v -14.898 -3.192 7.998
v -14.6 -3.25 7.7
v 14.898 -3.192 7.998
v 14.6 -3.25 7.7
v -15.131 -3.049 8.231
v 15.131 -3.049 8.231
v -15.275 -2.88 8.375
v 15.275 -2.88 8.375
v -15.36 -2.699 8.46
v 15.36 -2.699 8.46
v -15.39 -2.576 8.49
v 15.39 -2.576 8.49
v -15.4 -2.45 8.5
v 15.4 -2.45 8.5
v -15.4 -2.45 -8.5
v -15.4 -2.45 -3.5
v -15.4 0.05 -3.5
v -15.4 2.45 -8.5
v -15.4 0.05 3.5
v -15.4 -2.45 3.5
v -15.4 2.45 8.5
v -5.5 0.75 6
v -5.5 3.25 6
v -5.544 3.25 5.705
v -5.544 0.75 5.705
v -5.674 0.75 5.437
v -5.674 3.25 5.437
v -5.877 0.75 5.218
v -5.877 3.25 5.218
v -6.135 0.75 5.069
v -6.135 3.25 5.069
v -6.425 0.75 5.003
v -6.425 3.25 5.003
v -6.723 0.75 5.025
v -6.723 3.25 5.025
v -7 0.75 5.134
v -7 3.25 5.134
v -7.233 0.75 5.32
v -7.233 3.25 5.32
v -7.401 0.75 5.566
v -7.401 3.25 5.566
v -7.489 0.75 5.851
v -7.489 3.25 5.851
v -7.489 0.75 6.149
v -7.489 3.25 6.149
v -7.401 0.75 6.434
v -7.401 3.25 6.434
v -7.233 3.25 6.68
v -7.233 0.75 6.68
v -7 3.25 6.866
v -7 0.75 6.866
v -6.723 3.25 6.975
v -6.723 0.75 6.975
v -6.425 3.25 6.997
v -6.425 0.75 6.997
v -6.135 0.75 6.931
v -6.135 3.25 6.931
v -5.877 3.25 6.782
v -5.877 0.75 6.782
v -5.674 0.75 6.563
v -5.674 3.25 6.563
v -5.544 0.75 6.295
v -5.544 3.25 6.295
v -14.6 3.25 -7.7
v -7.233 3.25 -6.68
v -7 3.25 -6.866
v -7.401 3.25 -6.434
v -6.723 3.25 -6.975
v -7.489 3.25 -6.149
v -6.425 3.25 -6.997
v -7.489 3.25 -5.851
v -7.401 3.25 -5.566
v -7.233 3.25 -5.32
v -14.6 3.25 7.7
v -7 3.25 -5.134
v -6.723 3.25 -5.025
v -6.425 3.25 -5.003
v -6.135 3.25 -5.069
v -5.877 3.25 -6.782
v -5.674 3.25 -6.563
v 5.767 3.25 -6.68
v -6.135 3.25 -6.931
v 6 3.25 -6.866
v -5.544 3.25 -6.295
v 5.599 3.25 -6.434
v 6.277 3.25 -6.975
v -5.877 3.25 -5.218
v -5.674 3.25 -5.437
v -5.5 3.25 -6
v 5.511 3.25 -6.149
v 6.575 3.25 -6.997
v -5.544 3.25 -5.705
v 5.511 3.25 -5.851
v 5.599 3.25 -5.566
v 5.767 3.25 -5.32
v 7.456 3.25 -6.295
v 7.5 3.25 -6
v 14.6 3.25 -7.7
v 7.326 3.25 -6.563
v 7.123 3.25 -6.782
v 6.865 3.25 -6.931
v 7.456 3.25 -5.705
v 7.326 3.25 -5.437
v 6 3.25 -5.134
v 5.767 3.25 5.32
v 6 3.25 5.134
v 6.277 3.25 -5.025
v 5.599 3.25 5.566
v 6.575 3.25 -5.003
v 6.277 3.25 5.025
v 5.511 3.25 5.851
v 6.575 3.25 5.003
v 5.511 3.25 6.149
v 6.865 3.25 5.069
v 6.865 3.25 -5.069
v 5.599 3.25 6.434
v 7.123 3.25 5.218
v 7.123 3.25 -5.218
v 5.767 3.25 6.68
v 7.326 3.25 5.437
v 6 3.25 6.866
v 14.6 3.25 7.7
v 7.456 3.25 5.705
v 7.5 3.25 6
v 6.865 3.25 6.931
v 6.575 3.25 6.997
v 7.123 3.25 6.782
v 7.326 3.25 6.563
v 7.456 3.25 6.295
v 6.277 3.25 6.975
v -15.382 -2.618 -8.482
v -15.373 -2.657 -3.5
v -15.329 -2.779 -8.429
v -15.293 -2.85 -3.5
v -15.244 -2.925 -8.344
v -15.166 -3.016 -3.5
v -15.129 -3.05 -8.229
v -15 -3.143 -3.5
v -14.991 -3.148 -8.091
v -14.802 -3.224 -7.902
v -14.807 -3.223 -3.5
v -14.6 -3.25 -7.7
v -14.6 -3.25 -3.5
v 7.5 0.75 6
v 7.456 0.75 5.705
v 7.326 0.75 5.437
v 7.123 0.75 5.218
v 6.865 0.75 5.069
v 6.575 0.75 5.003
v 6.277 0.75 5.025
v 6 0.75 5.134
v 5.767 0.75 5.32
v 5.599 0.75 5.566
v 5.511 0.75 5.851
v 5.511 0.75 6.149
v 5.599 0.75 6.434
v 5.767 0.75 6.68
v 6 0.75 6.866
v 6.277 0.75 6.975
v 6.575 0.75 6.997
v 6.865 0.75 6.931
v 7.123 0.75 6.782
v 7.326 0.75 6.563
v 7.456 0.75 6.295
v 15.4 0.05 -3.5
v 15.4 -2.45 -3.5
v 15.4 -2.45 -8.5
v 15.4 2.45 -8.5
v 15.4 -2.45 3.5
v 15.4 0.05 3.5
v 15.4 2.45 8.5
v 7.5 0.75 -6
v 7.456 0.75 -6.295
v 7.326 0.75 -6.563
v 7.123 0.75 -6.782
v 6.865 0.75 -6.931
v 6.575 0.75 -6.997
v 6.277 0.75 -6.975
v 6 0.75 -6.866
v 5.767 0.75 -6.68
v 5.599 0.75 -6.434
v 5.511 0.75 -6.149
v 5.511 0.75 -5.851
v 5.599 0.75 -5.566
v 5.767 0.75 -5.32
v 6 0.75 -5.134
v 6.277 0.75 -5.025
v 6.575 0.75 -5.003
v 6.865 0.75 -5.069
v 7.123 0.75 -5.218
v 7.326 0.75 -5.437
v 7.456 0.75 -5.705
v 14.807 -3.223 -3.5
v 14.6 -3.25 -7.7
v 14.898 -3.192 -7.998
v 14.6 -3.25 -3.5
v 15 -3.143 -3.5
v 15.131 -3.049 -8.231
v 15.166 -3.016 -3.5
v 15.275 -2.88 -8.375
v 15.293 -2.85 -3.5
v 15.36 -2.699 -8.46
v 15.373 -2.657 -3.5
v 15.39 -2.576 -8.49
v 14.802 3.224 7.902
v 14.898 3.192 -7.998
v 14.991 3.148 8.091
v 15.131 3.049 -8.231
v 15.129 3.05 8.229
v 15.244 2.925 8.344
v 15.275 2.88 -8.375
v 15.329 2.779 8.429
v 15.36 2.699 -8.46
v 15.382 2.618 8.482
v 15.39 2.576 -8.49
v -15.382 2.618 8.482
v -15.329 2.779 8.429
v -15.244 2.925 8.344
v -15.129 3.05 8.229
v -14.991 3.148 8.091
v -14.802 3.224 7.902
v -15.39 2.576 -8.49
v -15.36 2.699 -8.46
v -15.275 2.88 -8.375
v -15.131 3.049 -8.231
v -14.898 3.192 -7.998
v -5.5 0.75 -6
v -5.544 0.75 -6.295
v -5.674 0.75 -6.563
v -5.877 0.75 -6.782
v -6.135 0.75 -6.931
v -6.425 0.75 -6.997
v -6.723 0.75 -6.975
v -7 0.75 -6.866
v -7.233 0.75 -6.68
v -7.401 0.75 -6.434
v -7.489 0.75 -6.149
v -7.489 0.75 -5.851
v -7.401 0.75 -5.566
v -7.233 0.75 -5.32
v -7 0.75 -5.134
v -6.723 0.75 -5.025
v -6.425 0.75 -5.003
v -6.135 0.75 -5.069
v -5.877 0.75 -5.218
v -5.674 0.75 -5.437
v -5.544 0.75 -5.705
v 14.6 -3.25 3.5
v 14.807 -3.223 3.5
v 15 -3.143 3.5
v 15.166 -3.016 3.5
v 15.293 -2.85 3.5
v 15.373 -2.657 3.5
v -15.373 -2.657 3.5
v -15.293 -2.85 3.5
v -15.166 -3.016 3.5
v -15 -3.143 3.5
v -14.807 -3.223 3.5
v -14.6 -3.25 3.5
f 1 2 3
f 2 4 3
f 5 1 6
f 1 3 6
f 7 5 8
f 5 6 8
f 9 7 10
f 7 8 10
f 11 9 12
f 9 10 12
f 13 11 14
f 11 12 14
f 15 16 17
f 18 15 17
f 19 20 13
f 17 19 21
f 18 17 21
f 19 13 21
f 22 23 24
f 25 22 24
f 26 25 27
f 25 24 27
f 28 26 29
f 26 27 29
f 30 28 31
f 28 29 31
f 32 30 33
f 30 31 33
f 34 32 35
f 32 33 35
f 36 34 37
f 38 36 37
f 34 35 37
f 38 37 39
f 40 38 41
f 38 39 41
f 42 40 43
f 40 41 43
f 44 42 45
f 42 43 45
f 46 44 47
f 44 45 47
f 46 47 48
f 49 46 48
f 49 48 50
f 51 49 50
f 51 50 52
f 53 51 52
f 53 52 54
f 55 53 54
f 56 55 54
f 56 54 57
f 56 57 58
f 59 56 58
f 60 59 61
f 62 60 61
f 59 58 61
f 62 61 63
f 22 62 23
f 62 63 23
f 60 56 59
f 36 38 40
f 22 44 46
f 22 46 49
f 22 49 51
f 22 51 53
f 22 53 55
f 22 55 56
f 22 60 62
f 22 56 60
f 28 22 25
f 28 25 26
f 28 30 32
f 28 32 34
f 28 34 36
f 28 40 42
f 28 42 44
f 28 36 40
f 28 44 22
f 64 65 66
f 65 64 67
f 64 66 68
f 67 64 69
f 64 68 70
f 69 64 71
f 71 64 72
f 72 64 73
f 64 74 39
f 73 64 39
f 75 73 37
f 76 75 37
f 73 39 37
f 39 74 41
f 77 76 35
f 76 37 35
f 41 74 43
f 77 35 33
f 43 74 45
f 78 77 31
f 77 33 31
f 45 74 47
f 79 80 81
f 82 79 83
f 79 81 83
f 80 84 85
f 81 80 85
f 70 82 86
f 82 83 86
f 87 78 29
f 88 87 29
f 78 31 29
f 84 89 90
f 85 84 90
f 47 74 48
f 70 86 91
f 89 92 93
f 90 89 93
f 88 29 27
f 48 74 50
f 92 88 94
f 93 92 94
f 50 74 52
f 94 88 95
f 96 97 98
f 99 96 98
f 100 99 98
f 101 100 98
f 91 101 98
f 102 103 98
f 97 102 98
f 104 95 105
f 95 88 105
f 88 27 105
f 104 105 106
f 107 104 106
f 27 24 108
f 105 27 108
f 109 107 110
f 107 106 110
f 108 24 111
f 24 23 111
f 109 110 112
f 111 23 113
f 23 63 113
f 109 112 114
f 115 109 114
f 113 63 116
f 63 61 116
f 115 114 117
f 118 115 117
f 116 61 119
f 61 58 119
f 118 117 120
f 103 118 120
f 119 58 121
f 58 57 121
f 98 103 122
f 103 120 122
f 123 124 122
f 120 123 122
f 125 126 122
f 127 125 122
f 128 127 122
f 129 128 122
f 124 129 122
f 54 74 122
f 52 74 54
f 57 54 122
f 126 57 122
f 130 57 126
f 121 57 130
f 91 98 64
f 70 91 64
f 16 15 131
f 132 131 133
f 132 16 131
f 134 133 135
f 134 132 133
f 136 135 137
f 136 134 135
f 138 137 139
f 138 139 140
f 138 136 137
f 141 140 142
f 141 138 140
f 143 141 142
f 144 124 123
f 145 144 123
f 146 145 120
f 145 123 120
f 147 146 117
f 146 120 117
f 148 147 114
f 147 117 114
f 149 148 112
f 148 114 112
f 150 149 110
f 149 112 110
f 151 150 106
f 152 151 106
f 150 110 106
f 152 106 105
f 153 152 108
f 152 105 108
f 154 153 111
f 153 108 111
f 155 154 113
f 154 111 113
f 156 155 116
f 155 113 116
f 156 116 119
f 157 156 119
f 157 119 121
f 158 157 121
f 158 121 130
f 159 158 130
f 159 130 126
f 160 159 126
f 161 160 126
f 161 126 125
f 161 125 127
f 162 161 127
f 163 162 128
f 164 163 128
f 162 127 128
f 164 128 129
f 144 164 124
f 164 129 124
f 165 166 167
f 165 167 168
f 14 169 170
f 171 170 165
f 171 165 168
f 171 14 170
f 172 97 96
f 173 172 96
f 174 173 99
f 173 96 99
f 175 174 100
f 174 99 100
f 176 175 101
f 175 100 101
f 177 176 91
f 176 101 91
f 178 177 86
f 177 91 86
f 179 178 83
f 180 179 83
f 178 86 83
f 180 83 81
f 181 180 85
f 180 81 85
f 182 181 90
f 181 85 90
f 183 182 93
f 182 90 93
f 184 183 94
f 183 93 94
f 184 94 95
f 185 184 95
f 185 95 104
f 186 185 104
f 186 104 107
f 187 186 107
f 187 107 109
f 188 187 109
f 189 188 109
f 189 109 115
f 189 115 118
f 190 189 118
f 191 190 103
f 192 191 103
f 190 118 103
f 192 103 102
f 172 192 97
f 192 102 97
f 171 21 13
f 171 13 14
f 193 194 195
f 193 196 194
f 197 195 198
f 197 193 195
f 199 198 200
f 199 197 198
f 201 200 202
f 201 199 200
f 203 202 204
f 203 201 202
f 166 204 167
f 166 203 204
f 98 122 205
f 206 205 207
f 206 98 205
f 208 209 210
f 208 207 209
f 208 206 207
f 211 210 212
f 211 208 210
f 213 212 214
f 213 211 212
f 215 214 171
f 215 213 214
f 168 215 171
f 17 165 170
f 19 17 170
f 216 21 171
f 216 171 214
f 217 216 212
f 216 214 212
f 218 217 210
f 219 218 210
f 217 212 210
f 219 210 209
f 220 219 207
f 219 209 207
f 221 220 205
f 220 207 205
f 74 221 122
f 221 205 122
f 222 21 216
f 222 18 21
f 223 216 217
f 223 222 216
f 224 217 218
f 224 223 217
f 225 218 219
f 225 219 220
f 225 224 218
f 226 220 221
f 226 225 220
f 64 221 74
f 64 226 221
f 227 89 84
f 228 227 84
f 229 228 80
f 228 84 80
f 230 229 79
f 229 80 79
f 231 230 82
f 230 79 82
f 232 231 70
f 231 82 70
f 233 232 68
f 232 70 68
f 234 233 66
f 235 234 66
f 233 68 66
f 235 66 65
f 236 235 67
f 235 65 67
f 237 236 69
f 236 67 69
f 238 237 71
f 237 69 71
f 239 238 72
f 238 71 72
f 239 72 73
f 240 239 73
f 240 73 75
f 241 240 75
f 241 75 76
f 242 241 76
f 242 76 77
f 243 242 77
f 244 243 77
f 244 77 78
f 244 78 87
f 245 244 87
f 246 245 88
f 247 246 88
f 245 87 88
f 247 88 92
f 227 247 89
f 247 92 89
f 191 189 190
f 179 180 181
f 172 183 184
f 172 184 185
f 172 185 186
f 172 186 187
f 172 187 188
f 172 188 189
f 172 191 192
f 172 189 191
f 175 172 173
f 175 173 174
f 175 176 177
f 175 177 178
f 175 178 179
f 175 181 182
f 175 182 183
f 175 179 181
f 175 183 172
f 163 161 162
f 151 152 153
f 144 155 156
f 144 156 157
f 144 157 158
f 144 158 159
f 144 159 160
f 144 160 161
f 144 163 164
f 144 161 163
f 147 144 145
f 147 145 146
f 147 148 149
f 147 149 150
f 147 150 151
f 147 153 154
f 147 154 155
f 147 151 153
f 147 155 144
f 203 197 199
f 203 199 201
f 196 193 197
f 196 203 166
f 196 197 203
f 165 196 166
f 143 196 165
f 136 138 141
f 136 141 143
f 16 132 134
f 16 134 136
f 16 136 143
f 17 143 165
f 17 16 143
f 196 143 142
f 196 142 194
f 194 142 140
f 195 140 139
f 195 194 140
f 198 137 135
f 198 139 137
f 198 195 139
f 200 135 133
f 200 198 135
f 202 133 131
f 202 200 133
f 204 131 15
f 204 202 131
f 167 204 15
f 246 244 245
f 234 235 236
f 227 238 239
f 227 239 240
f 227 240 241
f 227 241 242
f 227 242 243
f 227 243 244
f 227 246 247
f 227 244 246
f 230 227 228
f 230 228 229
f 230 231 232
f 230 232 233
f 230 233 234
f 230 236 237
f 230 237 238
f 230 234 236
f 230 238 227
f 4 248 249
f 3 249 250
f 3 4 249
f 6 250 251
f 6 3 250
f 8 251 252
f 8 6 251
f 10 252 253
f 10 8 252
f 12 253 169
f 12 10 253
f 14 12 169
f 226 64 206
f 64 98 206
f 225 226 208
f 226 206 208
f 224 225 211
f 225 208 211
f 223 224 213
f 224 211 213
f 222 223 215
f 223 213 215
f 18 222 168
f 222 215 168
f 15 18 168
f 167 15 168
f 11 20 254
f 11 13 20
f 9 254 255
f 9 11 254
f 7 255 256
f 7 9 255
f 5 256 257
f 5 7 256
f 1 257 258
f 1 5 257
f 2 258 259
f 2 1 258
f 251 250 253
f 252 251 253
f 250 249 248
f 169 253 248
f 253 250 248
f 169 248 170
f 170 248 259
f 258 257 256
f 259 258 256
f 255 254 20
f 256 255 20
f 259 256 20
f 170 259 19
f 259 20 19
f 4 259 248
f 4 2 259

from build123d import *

# Parameters (mm, degrees)
SKETCH_1_W          = 30.8
SKETCH_1_H          = 6.5
EXTRUDE_1_DEPTH     = 8.5
SKETCH_2_R          = 1
CUT_EXTRUDE_1_DEPTH = 2.5
CUT_EXTRUDE_2_REACH = 32.8
SKETCH_3_W          = 7
SKETCH_3_H          = 3.3
FILLET_1_R          = 0.8


with BuildPart() as part:
    # 草图1 → 凸台-拉伸1 (new body, symmetric)
    with BuildSketch(Plane.XY):
        Rectangle(SKETCH_1_W, SKETCH_1_H)
    extrude(amount=EXTRUDE_1_DEPTH, both=True)

    # 草图2 → 切除-拉伸1 (cut)
    with BuildSketch(Plane(origin=(0, 3.25, 0), x_dir=(1, 0, 0), z_dir=(0, 1, 0))):
        with Locations((-6.5, 6)):
            Circle(SKETCH_2_R)
        with Locations((-6.5, -6)):
            Circle(SKETCH_2_R)
        with Locations((6.5, 6)):
            Circle(SKETCH_2_R)
        with Locations((6.5, -6)):
            Circle(SKETCH_2_R)
    extrude(amount=-CUT_EXTRUDE_1_DEPTH, mode=Mode.SUBTRACT)

    # 草图3 → 切除-拉伸2 (cut, up to next)
    with BuildSketch(Plane.ZY.offset(15.4), mode=Mode.PRIVATE) as cut_extrude_2_sk1:
        with Locations((0, -1.6)):
            Rectangle(SKETCH_3_W, SKETCH_3_H)
    cut_extrude_2_tool1 = extrude(cut_extrude_2_sk1.sketch, amount=-CUT_EXTRUDE_2_REACH, mode=Mode.PRIVATE) & part.part
    add(cut_extrude_2_tool1.solids().sort_by_distance((-15.4, -1.6, 0))[0], mode=Mode.SUBTRACT)

    # 圆角1
    fillet_1_edges = [part.edges().sort_by_distance(p)[0] for p in [
        (0, 3.25, 8.5),
        (15.4, -3.25, -6),
        (-15.4, -3.25, -6),
        (0, 3.25, -8.5),
        (0, -3.25, -8.5),
        (0, -3.25, 8.5),
        (-15.4, 3.25, 0),
        (15.4, 3.25, 0),
        (15.4, -3.25, 6),
        (-15.4, -3.25, 6),
    ]]
    fillet(fillet_1_edges, radius=FILLET_1_R)


solid = part.part
